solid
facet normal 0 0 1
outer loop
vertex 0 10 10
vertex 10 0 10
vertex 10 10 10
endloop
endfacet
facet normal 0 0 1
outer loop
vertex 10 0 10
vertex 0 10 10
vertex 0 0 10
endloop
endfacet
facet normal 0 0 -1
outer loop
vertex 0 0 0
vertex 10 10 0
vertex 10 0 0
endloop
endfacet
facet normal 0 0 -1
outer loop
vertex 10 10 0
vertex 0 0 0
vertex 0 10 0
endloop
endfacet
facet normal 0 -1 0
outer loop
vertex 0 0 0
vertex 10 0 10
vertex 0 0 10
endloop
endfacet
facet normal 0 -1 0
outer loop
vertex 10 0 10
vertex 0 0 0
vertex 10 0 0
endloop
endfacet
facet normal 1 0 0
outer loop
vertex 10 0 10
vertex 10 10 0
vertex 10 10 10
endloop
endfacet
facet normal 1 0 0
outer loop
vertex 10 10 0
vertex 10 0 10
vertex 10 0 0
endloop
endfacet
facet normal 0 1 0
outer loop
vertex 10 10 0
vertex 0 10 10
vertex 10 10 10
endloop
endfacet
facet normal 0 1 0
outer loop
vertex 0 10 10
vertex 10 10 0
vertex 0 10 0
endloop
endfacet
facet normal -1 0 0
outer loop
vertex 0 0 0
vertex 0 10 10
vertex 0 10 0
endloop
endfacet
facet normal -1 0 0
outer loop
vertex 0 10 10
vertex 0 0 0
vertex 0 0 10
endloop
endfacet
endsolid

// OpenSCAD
// Generated by scadwright. Do not hand-edit —
// edit the Python source and regenerate.

color([0.2, 0.8, 0.3, 0.5]) {
    cube([10, 10, 10], center=false);
}
